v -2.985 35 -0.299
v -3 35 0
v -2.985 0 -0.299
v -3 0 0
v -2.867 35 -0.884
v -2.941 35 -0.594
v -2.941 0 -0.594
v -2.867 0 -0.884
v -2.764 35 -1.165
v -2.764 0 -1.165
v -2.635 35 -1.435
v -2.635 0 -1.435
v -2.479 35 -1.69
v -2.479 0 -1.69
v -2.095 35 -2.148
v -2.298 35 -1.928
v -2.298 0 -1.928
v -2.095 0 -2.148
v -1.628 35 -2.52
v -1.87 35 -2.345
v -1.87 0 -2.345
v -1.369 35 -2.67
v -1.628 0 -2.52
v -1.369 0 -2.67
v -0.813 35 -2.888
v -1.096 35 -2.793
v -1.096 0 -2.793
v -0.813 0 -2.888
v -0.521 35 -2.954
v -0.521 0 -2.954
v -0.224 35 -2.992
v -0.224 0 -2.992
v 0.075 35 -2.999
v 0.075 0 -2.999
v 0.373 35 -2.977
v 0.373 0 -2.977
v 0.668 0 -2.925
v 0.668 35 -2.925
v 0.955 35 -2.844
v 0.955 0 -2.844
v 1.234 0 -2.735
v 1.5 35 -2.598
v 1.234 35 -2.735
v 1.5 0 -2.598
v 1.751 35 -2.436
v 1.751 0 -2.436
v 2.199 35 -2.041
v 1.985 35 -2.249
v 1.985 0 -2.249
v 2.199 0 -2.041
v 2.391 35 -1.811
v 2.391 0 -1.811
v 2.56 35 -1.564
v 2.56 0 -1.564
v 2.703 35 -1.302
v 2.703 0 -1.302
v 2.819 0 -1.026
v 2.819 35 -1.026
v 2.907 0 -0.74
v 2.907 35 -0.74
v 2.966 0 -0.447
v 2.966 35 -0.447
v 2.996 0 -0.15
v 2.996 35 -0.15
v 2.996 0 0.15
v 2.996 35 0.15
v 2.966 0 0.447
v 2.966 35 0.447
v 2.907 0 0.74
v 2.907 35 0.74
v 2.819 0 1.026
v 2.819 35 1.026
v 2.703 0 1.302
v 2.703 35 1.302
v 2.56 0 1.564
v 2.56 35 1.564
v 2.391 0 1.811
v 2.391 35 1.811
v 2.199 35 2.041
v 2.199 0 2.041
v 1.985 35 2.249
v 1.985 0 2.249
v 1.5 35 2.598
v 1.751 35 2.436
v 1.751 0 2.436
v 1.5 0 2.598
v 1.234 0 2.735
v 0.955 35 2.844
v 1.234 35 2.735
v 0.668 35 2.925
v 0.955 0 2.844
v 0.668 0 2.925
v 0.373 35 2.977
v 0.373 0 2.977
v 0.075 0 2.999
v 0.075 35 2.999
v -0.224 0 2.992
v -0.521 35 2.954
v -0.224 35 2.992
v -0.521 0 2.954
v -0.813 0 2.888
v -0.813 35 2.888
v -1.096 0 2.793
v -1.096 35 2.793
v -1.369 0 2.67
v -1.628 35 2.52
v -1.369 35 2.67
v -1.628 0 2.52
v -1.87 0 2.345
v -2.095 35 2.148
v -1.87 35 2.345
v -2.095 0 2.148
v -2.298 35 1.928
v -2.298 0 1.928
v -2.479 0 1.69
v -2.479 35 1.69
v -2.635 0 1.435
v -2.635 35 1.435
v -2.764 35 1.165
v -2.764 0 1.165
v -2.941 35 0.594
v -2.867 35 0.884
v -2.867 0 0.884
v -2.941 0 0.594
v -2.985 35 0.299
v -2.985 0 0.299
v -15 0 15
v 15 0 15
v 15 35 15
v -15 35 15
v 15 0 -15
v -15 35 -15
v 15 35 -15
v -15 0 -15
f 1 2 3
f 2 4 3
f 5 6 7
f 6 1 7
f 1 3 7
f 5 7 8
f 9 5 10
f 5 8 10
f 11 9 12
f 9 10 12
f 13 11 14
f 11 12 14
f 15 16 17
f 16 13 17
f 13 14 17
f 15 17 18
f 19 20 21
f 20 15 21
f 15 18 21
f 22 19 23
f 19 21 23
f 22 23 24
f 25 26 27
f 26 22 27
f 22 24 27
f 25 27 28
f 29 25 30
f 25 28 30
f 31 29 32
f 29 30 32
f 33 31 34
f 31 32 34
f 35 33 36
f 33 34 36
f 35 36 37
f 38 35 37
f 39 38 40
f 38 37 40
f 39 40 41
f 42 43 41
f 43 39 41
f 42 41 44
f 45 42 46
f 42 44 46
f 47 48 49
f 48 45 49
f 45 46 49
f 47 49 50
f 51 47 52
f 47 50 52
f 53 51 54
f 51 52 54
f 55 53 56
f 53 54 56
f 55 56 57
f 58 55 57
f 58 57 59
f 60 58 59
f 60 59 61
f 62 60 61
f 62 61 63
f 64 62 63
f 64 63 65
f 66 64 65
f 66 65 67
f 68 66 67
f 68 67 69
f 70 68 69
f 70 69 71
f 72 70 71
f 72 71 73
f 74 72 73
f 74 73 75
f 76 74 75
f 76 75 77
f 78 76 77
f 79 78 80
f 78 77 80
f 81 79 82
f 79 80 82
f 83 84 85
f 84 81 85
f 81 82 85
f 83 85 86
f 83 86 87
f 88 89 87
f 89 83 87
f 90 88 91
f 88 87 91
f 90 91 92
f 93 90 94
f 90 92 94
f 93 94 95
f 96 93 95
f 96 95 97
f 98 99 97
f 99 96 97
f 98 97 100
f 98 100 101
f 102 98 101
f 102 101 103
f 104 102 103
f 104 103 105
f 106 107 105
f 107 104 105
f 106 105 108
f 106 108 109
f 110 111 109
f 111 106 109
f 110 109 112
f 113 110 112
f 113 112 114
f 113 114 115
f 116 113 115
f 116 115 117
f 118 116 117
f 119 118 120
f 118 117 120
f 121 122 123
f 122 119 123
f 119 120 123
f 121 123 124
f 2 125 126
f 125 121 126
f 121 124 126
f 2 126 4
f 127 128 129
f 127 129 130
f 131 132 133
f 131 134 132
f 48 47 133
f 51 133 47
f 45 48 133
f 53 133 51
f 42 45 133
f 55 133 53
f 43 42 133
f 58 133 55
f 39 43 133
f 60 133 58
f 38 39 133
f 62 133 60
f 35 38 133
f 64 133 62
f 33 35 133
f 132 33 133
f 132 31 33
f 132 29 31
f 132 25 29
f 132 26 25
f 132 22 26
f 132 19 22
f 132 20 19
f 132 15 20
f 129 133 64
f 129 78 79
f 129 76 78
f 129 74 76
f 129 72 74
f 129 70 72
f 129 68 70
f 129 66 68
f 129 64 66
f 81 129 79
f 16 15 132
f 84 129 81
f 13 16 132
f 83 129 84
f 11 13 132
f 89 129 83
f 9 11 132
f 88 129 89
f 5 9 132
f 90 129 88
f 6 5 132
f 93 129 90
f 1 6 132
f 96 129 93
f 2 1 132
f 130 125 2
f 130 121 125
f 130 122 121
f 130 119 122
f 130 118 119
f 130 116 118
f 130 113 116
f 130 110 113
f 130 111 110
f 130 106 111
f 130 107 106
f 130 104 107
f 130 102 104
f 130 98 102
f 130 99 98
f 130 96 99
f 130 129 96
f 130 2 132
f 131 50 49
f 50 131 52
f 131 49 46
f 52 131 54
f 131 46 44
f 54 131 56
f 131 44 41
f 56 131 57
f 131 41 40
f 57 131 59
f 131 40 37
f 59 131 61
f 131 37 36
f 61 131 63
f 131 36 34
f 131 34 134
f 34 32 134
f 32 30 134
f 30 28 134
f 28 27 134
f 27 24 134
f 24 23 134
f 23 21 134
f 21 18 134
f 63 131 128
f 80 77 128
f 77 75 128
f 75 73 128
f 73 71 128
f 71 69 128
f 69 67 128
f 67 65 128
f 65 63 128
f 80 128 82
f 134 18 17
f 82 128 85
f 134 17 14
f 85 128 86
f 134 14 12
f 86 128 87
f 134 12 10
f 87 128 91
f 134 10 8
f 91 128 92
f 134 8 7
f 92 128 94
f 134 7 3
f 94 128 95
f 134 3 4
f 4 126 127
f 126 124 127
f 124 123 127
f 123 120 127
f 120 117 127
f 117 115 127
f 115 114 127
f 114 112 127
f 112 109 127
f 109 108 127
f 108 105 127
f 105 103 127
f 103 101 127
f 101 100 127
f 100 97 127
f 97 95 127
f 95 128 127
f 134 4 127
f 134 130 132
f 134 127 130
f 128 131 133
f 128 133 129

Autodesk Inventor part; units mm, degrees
ref_plane "YZ Plane" through (0, 0, 0) normal (1, 0, 0) x (0, 1, 0)
ref_plane "XZ Plane" through (0, 0, 0) normal (0, 1, 0) x (-1, 0, 0)
ref_plane "XY Plane" through (0, 0, 0) normal (0, 0, 1) x (1, 0, 0)
sketch "Sketch1" plane through (0, 0, 0) normal (0, 1, 0) x (-1, 0, 0)
  line L0 (-15, 15) -> (15, 15)
  line L1 (15, 15) -> (15, -15)
  line L2 (15, -15) -> (-15, -15)
  line L3 (-15, -15) -> (-15, 15)
  line L4 (-15, 15) -> (15, -15) construction
  line L5 (15, 15) -> (-15, -15) construction
  circle A0 centre (0, 0) radius 3
  dimension "d0" = 30
  dimension "d1" = 30
  dimension "d2" = 6
extrude "Extrusion1" add sketch "Sketch1" along normal blind 35
